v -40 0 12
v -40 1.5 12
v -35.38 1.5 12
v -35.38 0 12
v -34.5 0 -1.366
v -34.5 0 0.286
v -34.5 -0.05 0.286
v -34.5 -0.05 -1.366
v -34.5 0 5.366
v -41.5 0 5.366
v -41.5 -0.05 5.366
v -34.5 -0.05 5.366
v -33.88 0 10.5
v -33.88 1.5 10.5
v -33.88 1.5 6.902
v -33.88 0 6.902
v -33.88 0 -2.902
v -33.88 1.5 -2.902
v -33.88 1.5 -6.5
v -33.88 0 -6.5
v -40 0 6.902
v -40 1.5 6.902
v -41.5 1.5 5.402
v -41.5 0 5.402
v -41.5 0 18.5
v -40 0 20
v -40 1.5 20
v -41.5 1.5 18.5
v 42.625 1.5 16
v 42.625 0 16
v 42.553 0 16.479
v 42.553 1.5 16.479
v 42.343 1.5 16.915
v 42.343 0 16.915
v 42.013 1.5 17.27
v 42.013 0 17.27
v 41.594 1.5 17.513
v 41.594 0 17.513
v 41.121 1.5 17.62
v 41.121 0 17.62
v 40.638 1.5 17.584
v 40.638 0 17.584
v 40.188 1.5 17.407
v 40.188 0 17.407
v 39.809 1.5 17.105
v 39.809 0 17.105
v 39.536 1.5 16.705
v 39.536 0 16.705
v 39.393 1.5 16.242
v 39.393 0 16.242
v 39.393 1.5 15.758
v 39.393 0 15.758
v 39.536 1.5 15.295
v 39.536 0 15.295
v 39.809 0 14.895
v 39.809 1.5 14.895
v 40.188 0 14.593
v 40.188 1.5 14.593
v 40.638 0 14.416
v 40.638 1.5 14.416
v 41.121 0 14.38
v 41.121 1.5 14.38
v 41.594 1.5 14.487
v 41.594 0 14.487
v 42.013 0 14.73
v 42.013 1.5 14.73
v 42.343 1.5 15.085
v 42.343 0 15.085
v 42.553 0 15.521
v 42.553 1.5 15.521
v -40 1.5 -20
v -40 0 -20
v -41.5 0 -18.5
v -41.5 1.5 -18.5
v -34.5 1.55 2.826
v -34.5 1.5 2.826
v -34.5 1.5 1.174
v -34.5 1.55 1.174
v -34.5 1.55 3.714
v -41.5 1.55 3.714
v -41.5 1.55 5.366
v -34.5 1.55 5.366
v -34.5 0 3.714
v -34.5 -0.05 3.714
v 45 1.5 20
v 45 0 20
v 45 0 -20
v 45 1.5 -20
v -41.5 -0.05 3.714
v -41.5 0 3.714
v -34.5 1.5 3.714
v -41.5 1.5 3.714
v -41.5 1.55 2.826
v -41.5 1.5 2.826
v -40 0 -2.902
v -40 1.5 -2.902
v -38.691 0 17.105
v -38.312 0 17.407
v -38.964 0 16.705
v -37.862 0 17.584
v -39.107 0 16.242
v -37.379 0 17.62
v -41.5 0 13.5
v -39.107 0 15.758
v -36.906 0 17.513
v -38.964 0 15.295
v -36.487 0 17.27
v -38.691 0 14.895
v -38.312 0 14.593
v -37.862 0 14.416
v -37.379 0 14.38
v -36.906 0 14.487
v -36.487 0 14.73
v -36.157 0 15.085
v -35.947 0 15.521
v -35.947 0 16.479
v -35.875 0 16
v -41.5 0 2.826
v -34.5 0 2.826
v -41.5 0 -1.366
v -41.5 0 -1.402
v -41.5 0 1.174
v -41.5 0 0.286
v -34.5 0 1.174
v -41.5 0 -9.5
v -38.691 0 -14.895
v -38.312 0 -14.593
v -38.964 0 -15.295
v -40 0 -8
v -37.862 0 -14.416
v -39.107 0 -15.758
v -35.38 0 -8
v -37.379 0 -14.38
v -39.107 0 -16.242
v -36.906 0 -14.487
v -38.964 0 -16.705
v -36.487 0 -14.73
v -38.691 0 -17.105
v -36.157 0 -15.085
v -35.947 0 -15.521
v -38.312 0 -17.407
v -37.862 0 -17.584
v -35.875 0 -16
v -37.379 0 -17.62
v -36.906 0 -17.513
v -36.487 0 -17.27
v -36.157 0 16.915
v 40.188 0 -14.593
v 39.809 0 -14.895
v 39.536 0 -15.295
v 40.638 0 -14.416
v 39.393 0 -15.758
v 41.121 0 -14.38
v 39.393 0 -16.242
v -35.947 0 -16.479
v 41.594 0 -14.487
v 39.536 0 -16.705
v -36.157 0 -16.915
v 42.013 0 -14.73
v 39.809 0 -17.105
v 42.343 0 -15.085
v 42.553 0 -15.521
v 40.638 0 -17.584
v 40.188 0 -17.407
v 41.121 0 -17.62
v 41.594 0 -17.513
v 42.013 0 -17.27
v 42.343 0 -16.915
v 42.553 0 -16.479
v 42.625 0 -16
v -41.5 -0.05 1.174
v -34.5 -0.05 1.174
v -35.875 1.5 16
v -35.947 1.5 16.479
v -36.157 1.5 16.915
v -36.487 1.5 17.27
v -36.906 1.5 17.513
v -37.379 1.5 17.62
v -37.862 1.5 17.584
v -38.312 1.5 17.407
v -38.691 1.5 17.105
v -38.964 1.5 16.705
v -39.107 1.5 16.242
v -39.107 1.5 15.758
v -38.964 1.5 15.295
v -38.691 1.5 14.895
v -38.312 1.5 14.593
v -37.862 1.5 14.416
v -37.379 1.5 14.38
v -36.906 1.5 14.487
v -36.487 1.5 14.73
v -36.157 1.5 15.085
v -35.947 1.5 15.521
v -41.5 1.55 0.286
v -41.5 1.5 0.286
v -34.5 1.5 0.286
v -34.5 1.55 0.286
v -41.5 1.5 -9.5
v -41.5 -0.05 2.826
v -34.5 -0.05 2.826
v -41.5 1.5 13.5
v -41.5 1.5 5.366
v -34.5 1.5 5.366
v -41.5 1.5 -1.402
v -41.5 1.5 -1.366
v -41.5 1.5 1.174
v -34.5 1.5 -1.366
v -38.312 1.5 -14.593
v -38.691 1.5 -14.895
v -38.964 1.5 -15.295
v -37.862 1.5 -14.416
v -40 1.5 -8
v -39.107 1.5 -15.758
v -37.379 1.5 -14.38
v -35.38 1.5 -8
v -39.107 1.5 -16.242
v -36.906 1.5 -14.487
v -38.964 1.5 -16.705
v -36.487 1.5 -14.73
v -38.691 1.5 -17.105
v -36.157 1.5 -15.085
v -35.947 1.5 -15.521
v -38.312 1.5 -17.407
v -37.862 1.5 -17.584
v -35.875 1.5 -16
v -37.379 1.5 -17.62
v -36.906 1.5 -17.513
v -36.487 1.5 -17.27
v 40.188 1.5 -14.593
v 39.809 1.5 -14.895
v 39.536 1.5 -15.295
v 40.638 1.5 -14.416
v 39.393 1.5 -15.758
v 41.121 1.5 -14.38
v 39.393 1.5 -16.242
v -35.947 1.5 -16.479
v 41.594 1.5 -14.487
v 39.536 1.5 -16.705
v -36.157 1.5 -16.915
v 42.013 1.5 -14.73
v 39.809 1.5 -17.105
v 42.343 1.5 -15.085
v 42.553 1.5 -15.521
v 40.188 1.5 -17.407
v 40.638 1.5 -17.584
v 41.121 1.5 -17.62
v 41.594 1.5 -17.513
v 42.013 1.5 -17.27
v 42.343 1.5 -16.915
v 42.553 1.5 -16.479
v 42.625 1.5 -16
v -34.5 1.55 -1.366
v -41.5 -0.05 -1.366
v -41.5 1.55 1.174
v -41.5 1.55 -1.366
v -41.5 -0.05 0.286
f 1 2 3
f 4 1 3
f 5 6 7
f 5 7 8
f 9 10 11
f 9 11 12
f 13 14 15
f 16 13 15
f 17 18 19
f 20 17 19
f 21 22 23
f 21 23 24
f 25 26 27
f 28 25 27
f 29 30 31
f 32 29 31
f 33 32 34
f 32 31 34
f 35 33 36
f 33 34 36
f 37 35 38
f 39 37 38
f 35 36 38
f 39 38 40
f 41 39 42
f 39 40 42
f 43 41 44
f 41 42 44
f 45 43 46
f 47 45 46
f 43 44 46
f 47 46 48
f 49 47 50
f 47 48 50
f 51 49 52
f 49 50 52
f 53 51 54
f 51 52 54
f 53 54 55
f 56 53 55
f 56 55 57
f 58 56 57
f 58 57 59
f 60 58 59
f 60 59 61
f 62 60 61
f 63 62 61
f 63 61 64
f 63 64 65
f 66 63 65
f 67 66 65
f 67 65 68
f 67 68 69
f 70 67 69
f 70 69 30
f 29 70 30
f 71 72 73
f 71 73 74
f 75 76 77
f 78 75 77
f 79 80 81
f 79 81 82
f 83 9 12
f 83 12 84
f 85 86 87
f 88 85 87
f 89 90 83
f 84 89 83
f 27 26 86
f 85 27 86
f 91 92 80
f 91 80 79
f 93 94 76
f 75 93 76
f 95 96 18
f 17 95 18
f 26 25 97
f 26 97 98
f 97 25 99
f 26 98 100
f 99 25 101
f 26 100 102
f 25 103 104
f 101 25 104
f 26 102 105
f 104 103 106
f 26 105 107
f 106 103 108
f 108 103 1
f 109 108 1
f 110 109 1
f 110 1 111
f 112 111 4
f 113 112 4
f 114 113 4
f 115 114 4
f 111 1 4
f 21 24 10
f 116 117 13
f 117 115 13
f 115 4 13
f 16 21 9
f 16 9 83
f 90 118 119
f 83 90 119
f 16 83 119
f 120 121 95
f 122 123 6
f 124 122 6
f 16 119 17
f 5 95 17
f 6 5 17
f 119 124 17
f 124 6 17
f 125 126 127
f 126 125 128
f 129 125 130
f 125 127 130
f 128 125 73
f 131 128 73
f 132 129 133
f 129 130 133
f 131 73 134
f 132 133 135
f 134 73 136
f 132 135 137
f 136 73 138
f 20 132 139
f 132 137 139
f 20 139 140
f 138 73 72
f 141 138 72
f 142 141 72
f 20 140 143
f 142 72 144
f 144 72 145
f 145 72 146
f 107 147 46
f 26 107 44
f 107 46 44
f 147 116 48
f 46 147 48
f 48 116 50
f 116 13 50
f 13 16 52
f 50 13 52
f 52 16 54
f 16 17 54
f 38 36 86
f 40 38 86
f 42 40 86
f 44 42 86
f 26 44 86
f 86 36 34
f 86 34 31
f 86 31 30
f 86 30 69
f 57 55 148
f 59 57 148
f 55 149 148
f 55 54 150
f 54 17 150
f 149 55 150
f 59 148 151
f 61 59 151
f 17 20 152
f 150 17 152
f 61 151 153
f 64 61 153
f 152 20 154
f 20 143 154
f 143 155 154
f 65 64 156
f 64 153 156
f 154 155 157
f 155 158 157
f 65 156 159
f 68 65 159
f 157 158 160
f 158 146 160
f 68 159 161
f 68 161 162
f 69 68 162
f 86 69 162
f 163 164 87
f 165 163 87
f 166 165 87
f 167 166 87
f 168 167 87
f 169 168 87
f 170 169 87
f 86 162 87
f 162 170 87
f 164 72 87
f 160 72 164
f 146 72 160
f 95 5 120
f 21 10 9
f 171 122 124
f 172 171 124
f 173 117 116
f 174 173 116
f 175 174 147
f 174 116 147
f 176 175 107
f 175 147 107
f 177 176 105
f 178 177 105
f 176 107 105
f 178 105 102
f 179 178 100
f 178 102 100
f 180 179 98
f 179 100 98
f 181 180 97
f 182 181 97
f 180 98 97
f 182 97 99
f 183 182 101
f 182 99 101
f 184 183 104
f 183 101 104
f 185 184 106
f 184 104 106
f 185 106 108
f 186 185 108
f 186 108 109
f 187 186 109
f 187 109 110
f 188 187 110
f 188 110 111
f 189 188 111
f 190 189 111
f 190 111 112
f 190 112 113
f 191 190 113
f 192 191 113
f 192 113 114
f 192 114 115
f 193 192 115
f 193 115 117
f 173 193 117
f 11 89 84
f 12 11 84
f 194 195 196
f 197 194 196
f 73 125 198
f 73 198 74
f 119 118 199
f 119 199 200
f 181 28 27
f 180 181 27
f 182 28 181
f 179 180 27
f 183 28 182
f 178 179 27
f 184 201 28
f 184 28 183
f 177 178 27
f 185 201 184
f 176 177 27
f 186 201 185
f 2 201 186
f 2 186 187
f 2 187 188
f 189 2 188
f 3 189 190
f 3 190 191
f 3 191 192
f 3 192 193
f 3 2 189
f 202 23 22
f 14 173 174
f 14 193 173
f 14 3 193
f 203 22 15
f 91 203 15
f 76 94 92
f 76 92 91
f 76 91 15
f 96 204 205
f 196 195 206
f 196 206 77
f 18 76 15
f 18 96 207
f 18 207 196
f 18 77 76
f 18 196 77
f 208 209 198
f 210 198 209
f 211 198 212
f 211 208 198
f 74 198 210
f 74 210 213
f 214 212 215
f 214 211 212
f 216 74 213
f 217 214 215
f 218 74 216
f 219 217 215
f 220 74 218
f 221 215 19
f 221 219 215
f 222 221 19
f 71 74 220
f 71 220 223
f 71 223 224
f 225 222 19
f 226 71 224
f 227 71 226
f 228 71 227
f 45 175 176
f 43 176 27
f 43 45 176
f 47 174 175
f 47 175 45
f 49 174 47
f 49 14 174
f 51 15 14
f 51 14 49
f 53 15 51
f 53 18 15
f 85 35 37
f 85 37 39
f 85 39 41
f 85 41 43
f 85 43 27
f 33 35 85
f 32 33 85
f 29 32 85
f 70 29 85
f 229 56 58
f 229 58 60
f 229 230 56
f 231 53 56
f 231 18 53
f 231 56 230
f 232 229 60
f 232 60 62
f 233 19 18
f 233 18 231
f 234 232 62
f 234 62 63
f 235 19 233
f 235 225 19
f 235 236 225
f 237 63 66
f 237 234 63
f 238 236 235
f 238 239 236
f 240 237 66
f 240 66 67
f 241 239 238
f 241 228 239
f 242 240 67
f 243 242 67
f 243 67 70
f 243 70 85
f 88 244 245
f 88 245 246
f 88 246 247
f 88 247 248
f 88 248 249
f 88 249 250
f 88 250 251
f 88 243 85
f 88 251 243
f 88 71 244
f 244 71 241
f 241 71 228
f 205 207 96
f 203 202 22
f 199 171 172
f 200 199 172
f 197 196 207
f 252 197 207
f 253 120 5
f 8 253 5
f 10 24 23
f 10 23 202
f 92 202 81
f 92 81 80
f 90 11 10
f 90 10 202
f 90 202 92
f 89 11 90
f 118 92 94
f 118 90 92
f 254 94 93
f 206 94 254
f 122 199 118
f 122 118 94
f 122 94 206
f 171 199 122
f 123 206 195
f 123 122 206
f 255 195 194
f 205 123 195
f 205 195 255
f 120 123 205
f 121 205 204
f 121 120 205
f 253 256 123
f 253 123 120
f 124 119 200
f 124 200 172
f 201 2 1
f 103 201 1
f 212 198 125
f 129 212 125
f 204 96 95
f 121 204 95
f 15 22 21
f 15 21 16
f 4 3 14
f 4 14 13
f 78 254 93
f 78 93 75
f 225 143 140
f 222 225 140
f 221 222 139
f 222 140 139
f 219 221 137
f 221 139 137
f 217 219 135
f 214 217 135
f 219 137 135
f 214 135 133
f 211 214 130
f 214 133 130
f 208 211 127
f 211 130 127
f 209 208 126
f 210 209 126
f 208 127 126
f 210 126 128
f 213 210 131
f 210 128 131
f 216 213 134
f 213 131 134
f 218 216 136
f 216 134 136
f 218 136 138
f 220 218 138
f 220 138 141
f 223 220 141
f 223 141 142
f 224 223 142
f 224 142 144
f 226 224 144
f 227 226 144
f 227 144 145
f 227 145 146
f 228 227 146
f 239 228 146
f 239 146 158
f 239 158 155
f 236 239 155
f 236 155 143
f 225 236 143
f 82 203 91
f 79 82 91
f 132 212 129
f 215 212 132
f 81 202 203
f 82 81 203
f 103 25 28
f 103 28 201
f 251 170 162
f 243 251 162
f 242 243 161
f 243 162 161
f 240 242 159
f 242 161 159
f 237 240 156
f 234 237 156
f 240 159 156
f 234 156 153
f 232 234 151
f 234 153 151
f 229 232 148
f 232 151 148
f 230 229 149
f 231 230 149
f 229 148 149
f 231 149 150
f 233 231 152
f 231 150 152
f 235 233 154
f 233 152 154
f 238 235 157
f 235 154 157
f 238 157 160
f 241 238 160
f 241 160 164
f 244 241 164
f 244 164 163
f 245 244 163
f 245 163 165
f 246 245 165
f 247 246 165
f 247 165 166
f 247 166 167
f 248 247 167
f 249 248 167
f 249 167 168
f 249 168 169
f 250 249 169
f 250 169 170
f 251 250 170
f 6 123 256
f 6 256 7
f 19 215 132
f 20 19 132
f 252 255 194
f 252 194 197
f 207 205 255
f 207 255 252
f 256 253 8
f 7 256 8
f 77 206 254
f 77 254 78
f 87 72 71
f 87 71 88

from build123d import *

# Parameters (mm, degrees)
SKETCH1_W                = 86.5
SKETCH1_H                = 40
BOSS_EXTRUDE1_DEPTH      = 1.5
SKETCH2_W                = 7.62
SKETCH2_H                = 5.0978
CUT_EXTRUDE1_DEPTH       = 2.5
CHAMFER2_SIZE            = 1.5
SKETCH4_R                = 1.625
CUT_EXTRUDE2_DEPTH       = 2.5
SKETCH3_W                = 7
SKETCH3_H                = 1.651
BOSS_EXTRUDE2_DEPTH      = 0.05
BOSS_EXTRUDE2_DEPTH_BACK = 1.55


with BuildPart() as part:
    # Sketch1 → Boss-Extrude1 (new body)
    with BuildSketch(Plane(origin=(0, 0, 0), x_dir=(1, 0, 0), z_dir=(0, 1, 0))):
        with Locations((1.75, 0)):
            Rectangle(SKETCH1_W, SKETCH1_H)
    extrude(amount=BOSS_EXTRUDE1_DEPTH)

    # Sketch2 → Cut-Extrude1 (cut, through all)
    with BuildSketch(Plane(origin=(0, 1.5, 0), x_dir=(1, 0, 0), z_dir=(0, 1, 0))):
        with Locations((-37.69, 5.4511)):
            Rectangle(SKETCH2_W, SKETCH2_H)
        with Locations((-37.69, -9.4511)):
            Rectangle(SKETCH2_W, SKETCH2_H)
    extrude(amount=-CUT_EXTRUDE1_DEPTH, mode=Mode.SUBTRACT)

    # Chamfer2
    chamfer2_edges = [part.edges().sort_by_distance(p)[0] for p in [
        (-41.5, 0.75, -2.9022),
        (-41.5, 0.75, -8),
        (-33.88, 0.75, -8),
        (-41.5, 0.75, 12),
        (-41.5, 0.75, 6.9022),
        (-33.88, 0.75, 12),
        (-41.5, 0.75, -20),
        (-41.5, 0.75, 20),
    ]]
    chamfer(chamfer2_edges, length=CHAMFER2_SIZE)

    # Sketch4 → Cut-Extrude2 (cut, through all)
    with BuildSketch(Plane.XZ):
        with Locations((-37.5, 16)):
            Circle(SKETCH4_R)
        with Locations((41, 16)):
            Circle(SKETCH4_R)
        with Locations((41, -16)):
            Circle(SKETCH4_R)
        with Locations((-37.5, -16)):
            Circle(SKETCH4_R)
    extrude(amount=-CUT_EXTRUDE2_DEPTH, mode=Mode.SUBTRACT)

    # Sketch3 → Boss-Extrude2 (add, two sides)
    with BuildSketch(Plane(origin=(0, 1.5, 0), x_dir=(1, 0, 0), z_dir=(0, 1, 0))) as boss_extrude2_sk:
        with Locations((-38, 0.54)):
            Rectangle(SKETCH3_W, SKETCH3_H)
        with Locations((-38, -2)):
            Rectangle(SKETCH3_W, SKETCH3_H)
        with Locations((-38, -4.54)):
            Rectangle(SKETCH3_W, SKETCH3_H)
    extrude(amount=BOSS_EXTRUDE2_DEPTH)
    extrude(boss_extrude2_sk.sketch, amount=-BOSS_EXTRUDE2_DEPTH_BACK)


solid = part.part
